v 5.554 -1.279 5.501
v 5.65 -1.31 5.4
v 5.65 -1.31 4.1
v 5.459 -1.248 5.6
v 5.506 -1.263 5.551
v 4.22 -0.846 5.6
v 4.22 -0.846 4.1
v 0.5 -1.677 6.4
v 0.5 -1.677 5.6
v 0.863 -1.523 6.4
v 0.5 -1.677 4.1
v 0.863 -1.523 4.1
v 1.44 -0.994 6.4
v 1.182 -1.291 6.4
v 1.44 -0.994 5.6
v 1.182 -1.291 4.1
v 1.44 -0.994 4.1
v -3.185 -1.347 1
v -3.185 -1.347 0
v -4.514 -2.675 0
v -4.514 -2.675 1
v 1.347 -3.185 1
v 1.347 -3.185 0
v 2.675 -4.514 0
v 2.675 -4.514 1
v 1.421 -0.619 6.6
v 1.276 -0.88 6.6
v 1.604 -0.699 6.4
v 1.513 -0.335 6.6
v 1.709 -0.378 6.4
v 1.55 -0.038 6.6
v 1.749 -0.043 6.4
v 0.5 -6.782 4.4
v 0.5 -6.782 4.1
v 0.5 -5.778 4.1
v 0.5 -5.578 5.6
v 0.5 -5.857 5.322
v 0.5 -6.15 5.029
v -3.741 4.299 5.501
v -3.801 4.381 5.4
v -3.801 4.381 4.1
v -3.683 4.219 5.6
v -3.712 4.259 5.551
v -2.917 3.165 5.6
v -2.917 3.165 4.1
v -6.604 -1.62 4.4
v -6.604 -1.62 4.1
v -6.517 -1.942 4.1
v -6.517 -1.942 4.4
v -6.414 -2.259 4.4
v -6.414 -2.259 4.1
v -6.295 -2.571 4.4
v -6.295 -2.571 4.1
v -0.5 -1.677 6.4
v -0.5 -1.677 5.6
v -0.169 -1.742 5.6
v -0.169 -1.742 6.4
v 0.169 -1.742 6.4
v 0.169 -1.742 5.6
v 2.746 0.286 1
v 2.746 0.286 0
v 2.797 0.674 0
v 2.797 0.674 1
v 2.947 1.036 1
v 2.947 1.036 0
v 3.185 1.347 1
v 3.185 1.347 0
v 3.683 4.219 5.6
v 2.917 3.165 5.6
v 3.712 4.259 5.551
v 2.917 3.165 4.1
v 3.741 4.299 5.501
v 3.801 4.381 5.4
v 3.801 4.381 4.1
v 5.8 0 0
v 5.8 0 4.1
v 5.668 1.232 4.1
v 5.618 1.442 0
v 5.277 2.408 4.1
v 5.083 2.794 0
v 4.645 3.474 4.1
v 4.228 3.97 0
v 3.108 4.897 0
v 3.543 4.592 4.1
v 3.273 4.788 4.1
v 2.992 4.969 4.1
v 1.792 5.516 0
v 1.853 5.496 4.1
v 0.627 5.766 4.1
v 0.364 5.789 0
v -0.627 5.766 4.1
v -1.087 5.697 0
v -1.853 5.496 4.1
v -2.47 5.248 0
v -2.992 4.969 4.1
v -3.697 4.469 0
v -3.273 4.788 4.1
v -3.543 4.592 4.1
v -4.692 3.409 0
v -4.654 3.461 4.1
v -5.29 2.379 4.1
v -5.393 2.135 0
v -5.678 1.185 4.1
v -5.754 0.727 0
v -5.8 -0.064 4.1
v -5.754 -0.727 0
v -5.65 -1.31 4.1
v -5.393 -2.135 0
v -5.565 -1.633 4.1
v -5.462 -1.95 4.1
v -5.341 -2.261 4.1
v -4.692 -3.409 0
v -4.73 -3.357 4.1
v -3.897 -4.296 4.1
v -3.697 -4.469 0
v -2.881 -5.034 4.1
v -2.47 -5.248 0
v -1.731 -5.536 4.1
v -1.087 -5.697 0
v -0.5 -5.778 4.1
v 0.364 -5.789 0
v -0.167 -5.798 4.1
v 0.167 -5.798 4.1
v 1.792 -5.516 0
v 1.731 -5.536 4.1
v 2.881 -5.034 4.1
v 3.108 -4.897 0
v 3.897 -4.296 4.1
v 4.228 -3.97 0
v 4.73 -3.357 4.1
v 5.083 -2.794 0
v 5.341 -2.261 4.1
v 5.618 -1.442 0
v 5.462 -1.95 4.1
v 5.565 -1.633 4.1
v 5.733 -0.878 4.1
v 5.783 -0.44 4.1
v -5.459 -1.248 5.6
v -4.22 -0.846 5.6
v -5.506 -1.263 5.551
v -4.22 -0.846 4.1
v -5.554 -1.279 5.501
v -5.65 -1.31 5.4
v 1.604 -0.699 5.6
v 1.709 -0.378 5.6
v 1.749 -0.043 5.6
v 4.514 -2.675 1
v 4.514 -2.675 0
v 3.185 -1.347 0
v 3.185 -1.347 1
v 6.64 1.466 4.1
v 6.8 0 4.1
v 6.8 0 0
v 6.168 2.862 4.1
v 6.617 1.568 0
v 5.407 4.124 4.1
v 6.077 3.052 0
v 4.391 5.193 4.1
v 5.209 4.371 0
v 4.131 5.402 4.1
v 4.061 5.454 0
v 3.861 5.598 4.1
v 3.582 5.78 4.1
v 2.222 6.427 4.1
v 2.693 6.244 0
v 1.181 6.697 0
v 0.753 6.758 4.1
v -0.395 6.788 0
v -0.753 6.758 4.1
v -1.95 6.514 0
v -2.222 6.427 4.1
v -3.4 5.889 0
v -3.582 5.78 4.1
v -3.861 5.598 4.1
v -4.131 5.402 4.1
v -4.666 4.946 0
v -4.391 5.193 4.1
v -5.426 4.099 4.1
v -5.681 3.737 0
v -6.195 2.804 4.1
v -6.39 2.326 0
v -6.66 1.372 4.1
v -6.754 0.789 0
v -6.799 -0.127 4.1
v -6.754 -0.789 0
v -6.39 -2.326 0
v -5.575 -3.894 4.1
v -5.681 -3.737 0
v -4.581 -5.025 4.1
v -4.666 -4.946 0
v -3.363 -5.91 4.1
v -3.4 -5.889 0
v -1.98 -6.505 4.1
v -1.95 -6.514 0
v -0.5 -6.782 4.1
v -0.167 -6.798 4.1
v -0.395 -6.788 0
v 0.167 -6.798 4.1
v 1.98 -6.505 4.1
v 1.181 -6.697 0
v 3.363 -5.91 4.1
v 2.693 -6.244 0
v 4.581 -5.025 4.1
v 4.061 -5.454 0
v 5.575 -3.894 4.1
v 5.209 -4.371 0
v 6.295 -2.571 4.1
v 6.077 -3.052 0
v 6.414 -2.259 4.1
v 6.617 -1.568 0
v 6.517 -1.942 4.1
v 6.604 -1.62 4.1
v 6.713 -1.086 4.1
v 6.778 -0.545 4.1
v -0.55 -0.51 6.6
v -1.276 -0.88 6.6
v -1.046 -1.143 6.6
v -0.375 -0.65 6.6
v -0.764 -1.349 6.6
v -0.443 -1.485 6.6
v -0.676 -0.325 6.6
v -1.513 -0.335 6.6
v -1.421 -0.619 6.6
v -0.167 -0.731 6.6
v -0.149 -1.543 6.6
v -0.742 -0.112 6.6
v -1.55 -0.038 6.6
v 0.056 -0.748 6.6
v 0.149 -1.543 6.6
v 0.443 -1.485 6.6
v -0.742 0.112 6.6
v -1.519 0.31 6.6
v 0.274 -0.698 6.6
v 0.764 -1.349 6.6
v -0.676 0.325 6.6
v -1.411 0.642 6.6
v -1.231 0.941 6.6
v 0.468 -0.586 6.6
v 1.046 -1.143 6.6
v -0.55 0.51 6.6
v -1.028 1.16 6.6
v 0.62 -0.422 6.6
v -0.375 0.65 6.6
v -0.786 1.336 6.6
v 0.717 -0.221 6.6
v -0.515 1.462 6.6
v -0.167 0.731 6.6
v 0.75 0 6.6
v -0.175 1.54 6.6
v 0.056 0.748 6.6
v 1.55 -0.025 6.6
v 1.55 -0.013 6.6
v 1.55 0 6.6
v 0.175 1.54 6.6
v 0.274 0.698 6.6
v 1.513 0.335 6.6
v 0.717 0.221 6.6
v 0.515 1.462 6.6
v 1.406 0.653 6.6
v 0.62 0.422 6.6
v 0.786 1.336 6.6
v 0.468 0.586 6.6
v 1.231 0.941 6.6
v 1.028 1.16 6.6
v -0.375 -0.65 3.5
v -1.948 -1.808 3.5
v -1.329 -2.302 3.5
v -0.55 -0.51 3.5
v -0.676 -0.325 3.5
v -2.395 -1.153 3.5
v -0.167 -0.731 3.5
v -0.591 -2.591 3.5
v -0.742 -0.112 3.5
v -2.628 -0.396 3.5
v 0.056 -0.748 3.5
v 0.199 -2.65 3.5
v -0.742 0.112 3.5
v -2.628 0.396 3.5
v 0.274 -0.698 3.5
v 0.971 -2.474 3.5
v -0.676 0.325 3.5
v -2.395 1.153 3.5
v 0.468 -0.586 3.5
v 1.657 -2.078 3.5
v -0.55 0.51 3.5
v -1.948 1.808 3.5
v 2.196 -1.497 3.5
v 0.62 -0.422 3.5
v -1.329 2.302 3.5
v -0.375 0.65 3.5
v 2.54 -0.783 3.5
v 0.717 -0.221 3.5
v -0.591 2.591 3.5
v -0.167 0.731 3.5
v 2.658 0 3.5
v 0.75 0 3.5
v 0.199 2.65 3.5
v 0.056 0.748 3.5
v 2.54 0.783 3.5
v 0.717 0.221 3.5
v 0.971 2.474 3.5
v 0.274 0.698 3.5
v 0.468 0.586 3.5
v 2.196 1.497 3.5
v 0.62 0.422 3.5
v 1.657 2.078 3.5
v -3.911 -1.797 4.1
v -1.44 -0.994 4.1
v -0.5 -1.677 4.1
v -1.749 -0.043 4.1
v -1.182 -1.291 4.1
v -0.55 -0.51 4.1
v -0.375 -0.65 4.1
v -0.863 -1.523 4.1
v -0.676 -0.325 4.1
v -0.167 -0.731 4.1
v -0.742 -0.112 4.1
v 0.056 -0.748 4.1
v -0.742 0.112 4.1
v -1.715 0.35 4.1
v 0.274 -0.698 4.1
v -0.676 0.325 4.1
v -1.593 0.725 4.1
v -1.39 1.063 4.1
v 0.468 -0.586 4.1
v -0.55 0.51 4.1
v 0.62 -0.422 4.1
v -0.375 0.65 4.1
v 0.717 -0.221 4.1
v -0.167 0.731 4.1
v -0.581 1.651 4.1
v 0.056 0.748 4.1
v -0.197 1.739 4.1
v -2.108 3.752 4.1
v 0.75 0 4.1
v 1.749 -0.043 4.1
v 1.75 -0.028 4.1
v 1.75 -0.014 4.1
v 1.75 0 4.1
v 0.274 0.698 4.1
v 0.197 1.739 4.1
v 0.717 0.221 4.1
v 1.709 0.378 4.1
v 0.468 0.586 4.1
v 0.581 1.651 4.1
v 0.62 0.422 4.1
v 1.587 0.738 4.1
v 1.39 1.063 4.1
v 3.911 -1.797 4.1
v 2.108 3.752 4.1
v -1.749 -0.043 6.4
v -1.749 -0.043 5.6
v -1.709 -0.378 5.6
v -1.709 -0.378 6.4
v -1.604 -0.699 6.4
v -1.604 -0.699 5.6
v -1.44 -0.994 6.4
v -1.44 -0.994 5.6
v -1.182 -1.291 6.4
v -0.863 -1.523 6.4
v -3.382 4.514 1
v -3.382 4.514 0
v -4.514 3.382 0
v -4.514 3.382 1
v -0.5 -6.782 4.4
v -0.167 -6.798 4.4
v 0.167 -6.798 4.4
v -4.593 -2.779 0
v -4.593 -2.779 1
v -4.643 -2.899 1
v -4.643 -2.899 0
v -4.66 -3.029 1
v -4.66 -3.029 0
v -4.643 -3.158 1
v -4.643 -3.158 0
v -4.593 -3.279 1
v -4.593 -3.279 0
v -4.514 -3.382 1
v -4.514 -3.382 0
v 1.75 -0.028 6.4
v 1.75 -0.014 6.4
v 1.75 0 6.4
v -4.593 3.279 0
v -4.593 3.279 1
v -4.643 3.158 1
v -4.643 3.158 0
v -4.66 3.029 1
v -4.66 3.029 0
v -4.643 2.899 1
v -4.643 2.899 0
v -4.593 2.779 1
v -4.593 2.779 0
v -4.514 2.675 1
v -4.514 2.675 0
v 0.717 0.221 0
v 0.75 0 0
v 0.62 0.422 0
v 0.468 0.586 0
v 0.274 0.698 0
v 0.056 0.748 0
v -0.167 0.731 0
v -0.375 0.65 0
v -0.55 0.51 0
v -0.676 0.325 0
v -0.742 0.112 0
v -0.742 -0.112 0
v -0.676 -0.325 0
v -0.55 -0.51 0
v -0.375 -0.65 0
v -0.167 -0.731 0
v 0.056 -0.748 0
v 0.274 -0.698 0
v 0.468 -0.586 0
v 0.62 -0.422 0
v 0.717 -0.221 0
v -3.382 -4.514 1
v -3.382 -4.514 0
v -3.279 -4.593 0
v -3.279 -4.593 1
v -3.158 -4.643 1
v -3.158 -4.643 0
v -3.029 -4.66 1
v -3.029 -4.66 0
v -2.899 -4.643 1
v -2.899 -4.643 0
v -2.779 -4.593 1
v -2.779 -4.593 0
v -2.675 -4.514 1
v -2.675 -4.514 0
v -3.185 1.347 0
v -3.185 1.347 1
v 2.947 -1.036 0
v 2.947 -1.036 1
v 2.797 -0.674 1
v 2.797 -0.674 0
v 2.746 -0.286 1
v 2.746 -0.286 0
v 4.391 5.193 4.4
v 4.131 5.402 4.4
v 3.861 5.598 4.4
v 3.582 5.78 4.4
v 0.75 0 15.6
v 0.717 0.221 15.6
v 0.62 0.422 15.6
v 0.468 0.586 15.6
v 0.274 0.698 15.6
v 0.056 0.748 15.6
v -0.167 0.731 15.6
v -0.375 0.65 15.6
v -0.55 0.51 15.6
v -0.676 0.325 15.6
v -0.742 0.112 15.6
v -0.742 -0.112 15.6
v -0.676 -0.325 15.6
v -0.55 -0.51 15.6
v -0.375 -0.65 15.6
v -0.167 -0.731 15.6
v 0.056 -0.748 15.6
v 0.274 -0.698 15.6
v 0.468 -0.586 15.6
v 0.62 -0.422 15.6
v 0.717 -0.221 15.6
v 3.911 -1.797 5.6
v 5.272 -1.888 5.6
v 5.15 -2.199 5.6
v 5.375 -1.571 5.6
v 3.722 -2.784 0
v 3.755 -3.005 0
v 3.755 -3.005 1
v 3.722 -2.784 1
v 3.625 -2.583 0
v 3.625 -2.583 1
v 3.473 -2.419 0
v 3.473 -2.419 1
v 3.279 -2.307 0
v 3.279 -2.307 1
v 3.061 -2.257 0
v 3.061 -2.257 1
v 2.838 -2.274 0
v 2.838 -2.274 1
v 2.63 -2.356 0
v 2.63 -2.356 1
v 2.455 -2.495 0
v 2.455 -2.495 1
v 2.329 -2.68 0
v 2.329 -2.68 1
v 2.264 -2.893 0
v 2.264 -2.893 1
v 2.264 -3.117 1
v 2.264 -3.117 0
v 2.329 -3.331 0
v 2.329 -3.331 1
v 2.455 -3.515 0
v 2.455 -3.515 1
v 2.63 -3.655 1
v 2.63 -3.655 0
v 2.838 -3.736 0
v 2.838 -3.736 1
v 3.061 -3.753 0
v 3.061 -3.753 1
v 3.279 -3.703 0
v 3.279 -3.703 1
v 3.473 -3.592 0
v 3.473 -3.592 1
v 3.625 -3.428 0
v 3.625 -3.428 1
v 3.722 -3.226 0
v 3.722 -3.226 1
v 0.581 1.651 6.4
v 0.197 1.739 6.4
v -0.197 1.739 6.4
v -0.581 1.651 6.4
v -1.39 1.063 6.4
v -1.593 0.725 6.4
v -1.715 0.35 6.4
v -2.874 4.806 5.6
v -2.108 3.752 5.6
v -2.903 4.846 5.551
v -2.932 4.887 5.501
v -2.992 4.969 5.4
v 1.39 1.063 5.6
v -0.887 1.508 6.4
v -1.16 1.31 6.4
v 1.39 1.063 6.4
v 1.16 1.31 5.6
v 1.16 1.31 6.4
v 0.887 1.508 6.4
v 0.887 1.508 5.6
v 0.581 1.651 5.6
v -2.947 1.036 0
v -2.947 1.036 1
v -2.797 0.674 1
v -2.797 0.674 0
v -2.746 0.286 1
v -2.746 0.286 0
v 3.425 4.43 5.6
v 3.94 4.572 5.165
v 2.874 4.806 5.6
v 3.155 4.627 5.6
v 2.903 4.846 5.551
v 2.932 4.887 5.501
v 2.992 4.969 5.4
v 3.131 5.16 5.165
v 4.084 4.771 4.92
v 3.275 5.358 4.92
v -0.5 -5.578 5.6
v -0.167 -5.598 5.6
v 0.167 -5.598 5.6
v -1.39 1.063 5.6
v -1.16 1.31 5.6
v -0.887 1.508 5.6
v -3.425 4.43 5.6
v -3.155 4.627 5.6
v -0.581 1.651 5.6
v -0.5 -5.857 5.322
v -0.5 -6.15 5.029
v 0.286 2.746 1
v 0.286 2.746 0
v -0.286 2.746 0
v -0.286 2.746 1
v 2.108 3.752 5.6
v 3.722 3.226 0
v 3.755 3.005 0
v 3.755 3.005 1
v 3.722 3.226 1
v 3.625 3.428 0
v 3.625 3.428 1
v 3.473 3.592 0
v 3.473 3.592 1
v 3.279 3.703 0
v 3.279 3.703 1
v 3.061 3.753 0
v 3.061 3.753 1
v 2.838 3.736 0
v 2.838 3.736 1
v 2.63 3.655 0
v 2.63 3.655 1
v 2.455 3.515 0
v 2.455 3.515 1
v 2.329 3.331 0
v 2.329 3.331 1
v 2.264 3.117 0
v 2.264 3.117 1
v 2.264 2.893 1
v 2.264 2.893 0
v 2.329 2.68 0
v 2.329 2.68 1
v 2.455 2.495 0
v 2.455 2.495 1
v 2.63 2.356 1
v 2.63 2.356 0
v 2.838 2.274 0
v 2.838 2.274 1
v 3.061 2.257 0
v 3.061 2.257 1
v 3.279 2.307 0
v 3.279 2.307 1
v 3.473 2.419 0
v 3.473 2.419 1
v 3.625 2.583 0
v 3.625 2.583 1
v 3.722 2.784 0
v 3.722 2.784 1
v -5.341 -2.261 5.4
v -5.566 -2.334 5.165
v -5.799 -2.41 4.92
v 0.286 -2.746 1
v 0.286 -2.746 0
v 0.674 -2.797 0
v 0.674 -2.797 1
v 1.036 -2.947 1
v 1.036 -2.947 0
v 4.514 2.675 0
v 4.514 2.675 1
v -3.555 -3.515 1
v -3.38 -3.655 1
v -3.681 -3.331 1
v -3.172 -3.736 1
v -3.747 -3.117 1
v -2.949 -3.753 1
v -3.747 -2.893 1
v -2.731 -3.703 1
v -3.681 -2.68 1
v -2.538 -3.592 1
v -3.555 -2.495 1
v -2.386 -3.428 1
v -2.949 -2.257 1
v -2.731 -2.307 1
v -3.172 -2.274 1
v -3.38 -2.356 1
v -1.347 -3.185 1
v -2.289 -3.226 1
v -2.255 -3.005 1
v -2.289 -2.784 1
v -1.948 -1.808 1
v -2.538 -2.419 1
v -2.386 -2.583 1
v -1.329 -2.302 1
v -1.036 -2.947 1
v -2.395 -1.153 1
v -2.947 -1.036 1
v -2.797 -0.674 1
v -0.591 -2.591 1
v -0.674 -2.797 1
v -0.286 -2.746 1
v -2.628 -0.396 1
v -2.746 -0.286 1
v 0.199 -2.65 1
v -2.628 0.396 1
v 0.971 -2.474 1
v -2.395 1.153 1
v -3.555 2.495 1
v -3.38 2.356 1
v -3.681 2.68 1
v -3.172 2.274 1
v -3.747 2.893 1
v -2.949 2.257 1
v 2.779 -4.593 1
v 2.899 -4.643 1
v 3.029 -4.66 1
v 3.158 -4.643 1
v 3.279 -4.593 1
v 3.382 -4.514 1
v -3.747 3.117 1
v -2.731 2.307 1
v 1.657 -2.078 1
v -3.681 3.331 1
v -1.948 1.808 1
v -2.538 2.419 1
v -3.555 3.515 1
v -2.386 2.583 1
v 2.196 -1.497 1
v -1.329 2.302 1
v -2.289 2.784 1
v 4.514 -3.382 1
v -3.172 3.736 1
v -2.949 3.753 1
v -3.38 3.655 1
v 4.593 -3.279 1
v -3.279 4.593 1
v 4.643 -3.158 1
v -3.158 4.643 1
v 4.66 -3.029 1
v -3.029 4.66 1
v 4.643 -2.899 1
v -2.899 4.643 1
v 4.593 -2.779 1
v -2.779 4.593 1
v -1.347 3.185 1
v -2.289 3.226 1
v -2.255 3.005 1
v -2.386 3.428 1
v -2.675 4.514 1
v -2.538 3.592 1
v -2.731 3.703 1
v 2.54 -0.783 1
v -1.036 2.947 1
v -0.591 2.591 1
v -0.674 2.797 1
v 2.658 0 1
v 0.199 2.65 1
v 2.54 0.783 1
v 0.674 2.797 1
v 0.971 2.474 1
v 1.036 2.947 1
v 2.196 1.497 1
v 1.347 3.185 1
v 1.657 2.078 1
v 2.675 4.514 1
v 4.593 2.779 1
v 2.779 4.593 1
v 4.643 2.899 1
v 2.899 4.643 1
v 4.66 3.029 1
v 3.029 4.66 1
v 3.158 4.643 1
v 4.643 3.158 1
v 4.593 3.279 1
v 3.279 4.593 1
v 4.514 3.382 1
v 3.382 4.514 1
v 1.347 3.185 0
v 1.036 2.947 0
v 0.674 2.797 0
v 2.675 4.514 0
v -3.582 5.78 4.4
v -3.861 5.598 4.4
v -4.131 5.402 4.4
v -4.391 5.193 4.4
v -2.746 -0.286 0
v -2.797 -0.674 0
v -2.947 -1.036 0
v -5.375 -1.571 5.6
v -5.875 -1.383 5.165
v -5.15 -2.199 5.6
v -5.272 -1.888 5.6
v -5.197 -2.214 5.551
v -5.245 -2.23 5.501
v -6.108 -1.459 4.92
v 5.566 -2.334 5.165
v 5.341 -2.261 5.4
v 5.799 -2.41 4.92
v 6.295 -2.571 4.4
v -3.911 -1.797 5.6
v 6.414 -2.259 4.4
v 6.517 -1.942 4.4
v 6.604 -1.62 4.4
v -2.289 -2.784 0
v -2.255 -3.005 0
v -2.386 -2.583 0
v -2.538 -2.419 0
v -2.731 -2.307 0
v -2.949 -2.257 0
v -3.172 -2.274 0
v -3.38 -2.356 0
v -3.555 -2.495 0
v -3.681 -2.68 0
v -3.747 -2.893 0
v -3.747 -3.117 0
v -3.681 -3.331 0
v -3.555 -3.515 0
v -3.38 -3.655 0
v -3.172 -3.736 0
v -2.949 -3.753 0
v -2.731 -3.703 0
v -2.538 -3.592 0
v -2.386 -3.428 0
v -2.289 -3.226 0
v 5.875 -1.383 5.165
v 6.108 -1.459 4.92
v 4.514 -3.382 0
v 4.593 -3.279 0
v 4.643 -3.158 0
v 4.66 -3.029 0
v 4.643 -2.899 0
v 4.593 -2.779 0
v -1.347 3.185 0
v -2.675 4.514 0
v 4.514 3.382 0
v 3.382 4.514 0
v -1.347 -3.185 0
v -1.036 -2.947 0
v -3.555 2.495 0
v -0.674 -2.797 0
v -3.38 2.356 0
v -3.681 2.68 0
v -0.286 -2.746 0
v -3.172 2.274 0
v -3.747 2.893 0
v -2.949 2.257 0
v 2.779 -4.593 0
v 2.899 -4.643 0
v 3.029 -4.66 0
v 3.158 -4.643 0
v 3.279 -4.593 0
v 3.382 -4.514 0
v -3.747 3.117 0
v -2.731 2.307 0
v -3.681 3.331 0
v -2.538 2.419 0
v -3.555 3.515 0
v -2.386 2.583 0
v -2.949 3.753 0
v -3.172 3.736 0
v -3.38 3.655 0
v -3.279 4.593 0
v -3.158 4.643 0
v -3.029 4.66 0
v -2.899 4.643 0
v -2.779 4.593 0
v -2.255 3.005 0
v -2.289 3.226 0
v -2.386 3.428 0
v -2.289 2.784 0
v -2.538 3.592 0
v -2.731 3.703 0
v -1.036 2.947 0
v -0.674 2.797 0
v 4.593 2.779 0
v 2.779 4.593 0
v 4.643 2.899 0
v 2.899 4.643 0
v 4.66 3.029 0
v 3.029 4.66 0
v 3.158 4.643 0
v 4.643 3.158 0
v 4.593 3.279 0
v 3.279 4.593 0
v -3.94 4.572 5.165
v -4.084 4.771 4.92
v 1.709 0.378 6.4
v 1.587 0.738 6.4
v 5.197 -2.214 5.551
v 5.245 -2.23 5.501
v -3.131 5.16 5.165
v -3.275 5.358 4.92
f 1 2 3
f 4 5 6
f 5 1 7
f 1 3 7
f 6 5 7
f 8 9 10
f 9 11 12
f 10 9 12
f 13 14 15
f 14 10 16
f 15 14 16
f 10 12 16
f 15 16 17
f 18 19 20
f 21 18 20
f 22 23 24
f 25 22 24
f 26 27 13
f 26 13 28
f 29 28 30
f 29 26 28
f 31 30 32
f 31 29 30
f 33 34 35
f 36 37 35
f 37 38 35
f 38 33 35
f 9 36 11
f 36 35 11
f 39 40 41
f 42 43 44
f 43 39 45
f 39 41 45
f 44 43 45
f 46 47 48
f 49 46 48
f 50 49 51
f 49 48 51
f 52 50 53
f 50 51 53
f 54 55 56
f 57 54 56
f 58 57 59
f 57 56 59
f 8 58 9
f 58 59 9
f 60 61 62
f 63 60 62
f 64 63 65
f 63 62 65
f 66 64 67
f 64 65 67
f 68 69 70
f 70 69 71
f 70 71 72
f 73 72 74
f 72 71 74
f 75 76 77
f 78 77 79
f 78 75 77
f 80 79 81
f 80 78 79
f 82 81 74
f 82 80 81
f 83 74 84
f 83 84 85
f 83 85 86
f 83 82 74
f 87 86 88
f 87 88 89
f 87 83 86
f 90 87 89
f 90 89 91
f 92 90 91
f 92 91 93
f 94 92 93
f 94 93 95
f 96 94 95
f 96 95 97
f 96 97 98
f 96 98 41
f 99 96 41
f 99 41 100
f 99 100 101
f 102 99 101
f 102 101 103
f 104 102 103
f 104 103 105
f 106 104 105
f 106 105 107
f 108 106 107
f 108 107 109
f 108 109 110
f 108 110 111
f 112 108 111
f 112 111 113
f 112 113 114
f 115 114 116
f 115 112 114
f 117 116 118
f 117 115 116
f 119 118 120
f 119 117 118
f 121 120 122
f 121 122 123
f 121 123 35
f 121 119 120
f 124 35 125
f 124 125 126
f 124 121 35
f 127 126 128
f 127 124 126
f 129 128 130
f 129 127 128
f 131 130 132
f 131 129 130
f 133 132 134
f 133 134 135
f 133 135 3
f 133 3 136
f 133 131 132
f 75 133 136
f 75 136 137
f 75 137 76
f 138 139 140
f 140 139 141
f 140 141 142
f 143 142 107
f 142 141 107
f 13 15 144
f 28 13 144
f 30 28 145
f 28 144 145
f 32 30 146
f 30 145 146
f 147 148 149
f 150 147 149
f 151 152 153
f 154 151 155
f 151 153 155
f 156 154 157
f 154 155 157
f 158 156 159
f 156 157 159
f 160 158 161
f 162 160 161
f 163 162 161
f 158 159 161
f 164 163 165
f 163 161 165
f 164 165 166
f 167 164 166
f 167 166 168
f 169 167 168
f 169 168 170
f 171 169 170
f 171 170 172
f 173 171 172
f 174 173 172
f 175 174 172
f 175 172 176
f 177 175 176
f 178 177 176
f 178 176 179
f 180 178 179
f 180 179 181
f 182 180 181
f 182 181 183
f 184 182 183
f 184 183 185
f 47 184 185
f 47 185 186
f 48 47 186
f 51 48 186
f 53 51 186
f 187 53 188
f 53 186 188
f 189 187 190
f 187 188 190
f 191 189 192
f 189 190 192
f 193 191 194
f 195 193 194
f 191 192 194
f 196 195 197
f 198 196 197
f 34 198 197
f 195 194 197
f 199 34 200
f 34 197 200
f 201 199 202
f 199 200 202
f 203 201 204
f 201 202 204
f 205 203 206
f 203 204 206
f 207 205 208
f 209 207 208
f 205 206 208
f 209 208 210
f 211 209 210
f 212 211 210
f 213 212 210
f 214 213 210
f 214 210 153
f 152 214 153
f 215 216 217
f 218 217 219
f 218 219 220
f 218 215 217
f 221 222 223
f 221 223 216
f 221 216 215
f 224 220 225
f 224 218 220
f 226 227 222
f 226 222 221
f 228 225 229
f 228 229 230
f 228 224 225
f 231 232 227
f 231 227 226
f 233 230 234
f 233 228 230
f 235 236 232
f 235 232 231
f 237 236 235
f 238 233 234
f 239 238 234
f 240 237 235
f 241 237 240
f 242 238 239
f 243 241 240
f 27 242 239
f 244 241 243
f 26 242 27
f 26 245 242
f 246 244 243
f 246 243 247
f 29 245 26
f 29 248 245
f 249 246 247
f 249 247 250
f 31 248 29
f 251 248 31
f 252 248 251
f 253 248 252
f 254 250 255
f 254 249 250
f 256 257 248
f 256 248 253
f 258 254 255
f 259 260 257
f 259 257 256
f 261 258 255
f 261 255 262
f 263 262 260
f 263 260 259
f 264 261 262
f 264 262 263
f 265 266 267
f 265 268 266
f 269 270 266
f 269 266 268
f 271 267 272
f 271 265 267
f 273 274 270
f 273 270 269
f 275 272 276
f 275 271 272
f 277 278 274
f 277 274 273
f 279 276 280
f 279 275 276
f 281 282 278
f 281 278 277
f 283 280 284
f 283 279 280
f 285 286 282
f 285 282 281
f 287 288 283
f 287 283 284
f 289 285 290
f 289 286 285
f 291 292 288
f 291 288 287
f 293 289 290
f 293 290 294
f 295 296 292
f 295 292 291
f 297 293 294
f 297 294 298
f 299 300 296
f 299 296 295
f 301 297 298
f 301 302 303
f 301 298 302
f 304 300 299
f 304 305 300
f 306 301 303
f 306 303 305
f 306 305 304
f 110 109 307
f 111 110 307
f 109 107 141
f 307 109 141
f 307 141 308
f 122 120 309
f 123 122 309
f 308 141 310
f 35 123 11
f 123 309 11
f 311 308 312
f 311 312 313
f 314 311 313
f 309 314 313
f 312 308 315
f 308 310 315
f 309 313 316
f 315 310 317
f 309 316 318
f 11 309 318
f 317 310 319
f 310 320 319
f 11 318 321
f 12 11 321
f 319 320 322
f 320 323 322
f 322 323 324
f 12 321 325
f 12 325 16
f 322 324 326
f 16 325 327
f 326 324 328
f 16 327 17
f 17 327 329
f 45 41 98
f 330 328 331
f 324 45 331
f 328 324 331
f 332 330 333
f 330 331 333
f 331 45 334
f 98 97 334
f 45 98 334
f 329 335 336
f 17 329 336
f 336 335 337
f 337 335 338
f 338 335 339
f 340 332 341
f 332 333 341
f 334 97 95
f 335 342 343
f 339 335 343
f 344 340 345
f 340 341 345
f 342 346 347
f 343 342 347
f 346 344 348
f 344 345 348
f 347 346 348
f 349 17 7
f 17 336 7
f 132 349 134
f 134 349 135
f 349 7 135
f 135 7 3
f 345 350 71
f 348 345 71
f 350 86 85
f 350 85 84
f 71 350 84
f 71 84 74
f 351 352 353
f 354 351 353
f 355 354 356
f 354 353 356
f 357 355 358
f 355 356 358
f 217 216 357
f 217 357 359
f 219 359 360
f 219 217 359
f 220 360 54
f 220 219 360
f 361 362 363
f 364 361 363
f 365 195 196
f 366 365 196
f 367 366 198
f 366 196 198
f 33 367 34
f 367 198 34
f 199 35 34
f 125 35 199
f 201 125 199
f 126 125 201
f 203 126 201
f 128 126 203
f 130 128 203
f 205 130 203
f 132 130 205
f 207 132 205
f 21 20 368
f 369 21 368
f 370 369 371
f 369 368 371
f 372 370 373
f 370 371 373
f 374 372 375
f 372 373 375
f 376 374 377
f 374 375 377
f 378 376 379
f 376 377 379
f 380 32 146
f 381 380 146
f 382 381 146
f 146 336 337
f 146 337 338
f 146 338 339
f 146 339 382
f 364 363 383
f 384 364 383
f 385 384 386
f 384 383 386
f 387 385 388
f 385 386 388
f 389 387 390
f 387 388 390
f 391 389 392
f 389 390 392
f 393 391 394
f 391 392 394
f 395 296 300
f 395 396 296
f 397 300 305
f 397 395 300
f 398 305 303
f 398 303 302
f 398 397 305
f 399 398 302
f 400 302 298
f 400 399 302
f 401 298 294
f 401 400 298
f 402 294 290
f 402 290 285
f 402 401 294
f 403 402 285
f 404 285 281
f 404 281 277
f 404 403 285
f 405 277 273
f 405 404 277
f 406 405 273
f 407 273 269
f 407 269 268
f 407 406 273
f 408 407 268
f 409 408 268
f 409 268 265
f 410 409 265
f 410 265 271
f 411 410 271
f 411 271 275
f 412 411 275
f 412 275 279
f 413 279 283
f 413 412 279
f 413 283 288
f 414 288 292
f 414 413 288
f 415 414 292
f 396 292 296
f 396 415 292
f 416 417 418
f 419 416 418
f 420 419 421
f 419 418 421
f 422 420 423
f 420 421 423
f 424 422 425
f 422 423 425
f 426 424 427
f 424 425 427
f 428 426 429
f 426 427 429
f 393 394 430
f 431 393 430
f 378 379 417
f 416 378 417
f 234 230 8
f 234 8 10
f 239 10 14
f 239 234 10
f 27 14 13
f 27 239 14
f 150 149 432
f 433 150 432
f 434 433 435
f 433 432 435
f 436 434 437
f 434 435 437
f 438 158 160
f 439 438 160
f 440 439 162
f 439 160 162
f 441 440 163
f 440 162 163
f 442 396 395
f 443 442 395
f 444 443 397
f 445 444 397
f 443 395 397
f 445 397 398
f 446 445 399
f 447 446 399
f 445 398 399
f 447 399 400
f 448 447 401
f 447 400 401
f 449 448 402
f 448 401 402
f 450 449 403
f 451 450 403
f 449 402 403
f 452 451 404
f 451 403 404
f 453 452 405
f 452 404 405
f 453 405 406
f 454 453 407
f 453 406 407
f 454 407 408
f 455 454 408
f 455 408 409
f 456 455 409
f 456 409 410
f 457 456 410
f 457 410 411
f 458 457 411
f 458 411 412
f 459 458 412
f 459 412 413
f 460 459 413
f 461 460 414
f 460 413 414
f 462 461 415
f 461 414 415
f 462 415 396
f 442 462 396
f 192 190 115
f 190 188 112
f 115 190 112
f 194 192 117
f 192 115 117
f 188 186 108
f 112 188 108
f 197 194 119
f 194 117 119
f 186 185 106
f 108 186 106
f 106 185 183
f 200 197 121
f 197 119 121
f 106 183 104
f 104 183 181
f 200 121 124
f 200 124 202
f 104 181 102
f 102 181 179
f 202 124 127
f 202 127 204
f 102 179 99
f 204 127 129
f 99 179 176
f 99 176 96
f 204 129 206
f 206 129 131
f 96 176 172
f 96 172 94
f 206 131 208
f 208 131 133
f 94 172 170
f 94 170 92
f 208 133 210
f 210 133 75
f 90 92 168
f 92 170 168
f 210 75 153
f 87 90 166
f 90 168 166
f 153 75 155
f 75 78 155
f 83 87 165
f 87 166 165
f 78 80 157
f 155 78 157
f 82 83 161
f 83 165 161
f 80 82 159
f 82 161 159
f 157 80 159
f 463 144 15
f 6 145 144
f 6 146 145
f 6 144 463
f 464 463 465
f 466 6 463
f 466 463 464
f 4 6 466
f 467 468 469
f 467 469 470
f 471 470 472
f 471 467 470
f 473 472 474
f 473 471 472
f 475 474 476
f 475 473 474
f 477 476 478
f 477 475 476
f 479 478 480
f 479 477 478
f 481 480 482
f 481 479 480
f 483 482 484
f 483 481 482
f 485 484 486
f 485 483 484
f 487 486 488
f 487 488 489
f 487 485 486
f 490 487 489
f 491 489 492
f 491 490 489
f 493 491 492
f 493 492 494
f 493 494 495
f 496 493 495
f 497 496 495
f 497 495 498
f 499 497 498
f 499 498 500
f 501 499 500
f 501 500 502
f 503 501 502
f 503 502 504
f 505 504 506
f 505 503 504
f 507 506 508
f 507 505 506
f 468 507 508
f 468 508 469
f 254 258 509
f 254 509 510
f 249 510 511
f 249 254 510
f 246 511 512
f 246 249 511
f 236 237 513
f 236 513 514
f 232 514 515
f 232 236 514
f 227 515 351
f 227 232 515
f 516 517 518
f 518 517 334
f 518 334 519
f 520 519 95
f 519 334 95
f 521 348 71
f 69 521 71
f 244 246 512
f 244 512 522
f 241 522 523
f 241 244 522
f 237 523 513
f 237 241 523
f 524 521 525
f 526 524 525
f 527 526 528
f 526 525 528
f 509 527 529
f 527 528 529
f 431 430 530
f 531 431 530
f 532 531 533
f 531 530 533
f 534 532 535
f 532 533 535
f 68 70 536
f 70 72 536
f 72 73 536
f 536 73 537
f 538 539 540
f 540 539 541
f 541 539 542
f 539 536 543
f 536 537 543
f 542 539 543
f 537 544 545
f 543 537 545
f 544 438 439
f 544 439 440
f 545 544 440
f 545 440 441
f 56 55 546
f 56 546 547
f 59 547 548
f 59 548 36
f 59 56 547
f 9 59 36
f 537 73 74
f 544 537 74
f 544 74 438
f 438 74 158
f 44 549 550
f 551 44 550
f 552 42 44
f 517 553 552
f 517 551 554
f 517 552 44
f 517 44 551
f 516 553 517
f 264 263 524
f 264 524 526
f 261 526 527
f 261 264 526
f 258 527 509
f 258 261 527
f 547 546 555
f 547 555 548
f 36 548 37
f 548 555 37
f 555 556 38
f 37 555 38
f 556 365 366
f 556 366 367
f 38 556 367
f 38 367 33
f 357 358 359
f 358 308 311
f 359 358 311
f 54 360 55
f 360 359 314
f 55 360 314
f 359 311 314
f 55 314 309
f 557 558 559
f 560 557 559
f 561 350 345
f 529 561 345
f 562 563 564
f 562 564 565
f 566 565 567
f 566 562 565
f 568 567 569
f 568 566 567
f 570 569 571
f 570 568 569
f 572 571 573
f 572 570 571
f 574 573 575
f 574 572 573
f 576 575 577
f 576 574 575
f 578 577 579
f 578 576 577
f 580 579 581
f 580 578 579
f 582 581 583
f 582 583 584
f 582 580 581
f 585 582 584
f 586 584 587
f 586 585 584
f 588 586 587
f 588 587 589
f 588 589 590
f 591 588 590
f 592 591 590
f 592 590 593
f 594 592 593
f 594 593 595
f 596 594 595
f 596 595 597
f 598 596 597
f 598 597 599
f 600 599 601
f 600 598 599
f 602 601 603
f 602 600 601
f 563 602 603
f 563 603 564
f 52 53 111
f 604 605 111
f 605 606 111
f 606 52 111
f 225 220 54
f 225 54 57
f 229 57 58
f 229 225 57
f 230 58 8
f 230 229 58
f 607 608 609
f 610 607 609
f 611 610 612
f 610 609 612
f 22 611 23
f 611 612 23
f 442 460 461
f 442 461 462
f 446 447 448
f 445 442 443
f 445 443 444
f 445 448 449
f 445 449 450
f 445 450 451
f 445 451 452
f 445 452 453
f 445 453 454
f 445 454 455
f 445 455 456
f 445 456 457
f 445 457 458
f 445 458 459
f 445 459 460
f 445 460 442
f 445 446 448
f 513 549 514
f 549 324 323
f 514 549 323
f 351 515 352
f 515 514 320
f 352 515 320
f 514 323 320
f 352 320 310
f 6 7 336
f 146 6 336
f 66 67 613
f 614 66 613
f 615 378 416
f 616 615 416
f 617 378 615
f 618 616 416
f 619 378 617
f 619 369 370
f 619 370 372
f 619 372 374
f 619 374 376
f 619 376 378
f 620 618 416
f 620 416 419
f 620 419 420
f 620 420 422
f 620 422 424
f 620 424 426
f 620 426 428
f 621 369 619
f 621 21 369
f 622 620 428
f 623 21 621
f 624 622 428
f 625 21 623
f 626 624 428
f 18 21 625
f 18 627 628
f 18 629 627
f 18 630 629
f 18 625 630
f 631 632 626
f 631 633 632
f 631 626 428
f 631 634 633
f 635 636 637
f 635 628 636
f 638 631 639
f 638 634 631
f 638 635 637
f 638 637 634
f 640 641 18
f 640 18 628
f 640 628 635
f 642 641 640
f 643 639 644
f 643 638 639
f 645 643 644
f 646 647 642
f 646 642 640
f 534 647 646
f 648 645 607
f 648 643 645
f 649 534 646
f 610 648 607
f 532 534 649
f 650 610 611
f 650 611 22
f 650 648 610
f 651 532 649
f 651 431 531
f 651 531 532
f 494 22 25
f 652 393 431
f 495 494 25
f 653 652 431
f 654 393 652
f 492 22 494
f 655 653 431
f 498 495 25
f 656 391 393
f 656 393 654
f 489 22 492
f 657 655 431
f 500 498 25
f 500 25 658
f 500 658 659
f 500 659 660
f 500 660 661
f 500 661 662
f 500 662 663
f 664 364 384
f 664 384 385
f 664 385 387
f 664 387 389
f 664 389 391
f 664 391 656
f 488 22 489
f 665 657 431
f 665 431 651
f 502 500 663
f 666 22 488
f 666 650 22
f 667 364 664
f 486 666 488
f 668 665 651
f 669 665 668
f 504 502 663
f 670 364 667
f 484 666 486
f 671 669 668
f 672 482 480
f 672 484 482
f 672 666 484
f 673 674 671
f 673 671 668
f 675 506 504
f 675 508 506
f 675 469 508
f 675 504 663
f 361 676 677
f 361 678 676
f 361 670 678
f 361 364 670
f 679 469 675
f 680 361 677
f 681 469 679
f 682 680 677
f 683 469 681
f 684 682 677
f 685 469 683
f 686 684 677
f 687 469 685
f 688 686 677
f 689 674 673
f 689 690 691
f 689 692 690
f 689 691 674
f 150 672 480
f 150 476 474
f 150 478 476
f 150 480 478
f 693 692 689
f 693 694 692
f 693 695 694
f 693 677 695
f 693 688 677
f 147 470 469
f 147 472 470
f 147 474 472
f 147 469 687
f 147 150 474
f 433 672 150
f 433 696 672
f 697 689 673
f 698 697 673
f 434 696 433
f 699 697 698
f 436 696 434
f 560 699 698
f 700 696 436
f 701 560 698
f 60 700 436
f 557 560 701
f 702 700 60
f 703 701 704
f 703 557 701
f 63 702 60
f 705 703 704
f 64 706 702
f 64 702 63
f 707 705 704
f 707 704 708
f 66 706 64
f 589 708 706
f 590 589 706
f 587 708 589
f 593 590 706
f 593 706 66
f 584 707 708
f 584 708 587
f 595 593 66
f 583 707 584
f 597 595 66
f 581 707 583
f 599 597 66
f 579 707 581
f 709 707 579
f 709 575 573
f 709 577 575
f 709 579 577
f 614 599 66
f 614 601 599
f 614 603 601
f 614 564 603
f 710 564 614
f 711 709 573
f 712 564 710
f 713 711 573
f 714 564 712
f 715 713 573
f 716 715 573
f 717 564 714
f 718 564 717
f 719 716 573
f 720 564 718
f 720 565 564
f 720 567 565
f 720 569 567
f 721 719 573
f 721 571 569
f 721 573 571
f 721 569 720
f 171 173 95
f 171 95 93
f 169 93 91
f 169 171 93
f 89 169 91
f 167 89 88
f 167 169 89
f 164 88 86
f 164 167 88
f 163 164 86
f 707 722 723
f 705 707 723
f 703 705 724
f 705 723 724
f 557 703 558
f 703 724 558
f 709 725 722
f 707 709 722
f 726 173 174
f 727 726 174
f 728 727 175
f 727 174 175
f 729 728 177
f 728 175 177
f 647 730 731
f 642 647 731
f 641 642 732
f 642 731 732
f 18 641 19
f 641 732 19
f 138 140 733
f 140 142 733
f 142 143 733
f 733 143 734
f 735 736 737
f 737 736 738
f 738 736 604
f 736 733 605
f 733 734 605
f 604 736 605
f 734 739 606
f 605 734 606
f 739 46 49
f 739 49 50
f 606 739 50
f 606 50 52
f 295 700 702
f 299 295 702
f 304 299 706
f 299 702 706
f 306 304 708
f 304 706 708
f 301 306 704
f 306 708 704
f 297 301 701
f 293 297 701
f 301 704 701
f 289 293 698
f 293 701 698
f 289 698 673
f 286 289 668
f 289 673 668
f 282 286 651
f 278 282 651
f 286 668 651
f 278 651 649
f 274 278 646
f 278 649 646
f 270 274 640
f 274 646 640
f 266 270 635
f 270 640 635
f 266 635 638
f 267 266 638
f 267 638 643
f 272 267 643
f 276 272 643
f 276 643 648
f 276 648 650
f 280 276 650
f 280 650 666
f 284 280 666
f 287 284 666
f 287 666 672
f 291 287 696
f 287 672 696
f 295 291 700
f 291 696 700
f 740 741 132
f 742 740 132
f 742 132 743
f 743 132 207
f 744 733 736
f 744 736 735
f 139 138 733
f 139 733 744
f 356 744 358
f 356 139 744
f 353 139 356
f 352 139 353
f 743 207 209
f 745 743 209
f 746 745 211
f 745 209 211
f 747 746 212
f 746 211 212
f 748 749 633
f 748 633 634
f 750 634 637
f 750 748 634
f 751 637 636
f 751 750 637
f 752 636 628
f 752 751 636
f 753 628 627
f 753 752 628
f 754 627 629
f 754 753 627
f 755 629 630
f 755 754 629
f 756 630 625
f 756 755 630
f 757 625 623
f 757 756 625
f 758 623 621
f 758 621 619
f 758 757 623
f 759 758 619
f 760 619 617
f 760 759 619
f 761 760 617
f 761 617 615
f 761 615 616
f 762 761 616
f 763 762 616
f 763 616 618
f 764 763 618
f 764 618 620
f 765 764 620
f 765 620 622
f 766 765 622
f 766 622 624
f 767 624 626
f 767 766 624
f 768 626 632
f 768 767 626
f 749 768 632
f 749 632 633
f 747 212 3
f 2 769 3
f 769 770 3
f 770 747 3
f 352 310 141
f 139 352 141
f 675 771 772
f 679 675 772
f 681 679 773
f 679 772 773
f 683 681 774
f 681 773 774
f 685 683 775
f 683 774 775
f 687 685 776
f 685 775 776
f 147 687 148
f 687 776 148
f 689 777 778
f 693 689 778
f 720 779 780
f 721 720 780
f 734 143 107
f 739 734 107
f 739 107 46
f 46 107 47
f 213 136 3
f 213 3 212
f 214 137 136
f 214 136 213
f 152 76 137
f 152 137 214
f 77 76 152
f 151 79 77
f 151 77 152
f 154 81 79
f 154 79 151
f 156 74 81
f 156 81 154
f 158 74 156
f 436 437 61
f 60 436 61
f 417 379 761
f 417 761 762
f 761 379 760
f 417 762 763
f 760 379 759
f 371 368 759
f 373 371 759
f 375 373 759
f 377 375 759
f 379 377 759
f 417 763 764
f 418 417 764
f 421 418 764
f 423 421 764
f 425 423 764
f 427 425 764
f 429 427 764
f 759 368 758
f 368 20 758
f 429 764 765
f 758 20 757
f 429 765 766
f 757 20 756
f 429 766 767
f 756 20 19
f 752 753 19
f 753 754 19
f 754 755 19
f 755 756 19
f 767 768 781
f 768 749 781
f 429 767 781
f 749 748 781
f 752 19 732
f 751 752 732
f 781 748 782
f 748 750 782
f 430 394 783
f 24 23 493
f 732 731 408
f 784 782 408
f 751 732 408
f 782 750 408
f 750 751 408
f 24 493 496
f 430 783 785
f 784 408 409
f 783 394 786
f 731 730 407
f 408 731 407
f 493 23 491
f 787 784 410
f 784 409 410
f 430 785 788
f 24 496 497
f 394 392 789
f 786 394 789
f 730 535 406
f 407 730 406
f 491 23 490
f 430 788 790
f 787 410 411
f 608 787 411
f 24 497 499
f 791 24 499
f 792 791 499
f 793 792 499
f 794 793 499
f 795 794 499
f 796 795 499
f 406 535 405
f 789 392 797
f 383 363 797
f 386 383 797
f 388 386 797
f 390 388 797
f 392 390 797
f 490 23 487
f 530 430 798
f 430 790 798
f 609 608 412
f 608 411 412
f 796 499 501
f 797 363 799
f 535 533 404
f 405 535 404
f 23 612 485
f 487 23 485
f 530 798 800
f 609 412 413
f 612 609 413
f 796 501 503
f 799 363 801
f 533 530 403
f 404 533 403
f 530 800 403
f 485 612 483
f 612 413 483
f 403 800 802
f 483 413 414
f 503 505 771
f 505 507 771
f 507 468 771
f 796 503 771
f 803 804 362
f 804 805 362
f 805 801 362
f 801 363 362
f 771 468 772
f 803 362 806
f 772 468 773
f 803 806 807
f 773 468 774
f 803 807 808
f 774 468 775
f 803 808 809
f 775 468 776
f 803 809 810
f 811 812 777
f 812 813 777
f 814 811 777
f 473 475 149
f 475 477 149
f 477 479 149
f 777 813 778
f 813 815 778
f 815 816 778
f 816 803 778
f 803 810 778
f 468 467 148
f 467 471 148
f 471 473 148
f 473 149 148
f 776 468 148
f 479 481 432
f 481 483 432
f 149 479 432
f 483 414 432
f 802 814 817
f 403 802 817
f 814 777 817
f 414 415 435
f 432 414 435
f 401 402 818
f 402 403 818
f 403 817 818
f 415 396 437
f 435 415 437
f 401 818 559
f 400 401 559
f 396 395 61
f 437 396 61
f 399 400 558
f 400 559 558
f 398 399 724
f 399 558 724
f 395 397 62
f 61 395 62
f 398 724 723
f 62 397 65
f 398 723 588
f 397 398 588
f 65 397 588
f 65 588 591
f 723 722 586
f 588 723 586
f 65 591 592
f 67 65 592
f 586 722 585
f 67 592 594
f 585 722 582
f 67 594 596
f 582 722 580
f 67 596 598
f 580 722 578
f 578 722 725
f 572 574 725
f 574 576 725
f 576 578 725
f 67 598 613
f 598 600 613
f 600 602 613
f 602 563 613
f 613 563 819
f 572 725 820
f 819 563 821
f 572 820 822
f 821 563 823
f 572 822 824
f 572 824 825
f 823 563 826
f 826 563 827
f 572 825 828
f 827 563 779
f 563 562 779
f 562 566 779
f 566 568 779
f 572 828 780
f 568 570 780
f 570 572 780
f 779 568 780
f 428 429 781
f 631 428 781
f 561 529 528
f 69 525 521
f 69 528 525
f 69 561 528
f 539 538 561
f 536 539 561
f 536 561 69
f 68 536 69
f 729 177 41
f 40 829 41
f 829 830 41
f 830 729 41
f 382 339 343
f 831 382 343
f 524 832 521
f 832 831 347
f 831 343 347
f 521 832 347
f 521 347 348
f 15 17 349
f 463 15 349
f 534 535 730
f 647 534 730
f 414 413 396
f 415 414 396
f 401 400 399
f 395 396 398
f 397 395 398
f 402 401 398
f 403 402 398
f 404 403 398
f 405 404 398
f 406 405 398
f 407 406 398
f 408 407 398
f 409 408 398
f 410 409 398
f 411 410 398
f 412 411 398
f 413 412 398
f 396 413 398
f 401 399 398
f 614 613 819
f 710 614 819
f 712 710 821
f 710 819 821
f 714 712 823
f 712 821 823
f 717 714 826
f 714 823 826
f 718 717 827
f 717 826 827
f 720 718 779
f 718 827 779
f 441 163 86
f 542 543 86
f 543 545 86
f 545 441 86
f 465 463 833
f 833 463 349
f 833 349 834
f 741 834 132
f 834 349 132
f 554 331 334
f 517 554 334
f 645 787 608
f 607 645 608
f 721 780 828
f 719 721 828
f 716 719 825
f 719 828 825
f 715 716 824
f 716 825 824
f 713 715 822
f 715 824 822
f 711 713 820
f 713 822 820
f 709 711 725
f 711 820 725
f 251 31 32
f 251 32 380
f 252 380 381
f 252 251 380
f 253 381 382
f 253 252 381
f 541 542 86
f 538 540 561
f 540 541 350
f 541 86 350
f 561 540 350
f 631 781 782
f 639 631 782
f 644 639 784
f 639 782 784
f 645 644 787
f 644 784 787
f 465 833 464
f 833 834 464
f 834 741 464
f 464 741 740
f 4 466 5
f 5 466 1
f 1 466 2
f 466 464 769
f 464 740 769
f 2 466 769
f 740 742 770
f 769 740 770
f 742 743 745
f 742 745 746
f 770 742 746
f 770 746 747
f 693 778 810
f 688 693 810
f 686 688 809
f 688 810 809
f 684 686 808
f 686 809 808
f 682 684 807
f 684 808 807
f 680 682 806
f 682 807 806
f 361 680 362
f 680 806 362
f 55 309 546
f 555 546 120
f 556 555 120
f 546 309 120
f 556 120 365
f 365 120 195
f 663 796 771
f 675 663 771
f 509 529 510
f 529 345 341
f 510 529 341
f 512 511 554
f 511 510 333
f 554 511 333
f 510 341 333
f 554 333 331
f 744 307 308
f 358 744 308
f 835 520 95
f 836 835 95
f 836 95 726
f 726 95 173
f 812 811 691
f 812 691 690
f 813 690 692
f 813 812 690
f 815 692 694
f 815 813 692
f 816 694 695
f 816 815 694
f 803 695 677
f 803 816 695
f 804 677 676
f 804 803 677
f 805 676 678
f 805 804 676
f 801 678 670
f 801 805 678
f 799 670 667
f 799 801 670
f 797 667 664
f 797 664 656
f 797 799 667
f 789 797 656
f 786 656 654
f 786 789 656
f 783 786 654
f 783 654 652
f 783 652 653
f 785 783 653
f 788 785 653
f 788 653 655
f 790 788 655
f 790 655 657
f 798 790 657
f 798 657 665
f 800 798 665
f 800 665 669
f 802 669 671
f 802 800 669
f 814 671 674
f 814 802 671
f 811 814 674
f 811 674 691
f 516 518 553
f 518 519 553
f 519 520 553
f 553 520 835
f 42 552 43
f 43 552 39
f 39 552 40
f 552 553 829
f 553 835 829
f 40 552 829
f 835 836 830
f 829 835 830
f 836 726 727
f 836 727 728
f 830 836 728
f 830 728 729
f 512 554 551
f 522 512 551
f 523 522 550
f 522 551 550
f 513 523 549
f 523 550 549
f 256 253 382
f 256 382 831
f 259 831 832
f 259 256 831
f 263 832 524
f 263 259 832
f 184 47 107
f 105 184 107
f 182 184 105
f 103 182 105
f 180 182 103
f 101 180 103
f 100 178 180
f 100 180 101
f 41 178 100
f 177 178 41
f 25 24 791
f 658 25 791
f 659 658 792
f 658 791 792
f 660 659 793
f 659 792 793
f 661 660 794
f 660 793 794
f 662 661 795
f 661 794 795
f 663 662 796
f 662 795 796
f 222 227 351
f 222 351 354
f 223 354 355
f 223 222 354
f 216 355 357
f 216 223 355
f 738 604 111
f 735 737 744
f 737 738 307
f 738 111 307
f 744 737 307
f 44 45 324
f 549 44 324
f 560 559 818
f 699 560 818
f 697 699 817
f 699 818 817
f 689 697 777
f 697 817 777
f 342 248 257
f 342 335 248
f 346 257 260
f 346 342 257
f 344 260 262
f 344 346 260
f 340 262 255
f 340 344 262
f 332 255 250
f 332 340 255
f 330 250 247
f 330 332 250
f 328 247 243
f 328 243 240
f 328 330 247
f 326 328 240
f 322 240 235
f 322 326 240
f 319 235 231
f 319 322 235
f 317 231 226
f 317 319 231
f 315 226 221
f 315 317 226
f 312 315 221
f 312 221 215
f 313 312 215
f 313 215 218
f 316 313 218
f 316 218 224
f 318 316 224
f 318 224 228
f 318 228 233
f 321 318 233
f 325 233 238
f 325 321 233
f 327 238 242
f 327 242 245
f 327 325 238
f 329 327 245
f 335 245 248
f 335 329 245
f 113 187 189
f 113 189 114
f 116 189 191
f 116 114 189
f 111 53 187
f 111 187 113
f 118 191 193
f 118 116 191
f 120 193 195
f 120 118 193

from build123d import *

# Parameters (mm, degrees)
F0_R      = 0.75
F1_DEPTH  = 1
F2_R      = 6.8
F2_R_2    = 5.8
F3_DEPTH  = 4.1
F4_R      = 2.6577966349
F4_R_2    = 0.75
F5_DEPTH  = 2.5
F6_R      = 0.75
F7_DEPTH  = 1.5
F8_SIZE   = 1.2
F9_R      = 0.75
F10_DEPTH = 15.6
F11_R     = 0.75
F12_DEPTH = 1
F13_SIZE  = 0.2


with BuildPart() as f1:
    # F0 (on Top) → F1 (new body)
    with BuildSketch(Plane.XY):
        with BuildLine():
            Line((4.5137502952, 3.3823794453), (3.3823794453, 4.5137502952))
            ThreePointArc((3.3823794453, 4.5137502952), (3.0288260547, 4.6601969046), (2.6752726641, 4.5137502952))
            Line((2.6752726641, 4.5137502952), (1.3468455393, 3.1853231704))
            ThreePointArc((1.3468455393, 3.1853231704), (0.8602105161, 2.8601640434), (0.2861853675, 2.7459833422))
            Line((0.2861853675, 2.7459833422), (-0.2861853675, 2.7459833422))
            ThreePointArc((-0.2861853675, 2.7459833422), (-0.8602105161, 2.8601640434), (-1.3468455393, 3.1853231704))
            Line((-1.3468455393, 3.1853231704), (-2.6752726641, 4.5137502952))
            ThreePointArc((-2.6752726641, 4.5137502952), (-3.0288260547, 4.6601969046), (-3.3823794453, 4.5137502952))
            Line((-3.3823794453, 4.5137502952), (-4.5137502952, 3.3823794453))
            ThreePointArc((-4.5137502952, 3.3823794453), (-4.6601969046, 3.0288260547), (-4.5137502952, 2.6752726641))
            Line((-4.5137502952, 2.6752726641), (-3.1853231704, 1.3468455393))
            ThreePointArc((-3.1853231704, 1.3468455393), (-2.8601640434, 0.8602105161), (-2.7459833422, 0.2861853675))
            Line((-2.7459833422, 0.2861853675), (-2.7459833422, -0.2861853675))
            ThreePointArc((-2.7459833422, -0.2861853675), (-2.8601640434, -0.8602105161), (-3.1853231704, -1.3468455393))
            Line((-3.1853231704, -1.3468455393), (-4.5137502952, -2.6752726641))
            ThreePointArc((-4.5137502952, -2.6752726641), (-4.6601969046, -3.0288260547), (-4.5137502952, -3.3823794453))
            Line((-4.5137502952, -3.3823794453), (-3.3823794453, -4.5137502952))
            ThreePointArc((-3.3823794453, -4.5137502952), (-3.0288260547, -4.6601969046), (-2.6752726641, -4.5137502952))
            Line((-2.6752726641, -4.5137502952), (-1.3468455393, -3.1853231704))
            ThreePointArc((-1.3468455393, -3.1853231704), (-0.8602105161, -2.8601640434), (-0.2861853675, -2.7459833422))
            Line((-0.2861853675, -2.7459833422), (0.2861853675, -2.7459833422))
            ThreePointArc((0.2861853675, -2.7459833422), (0.8602105161, -2.8601640434), (1.3468455393, -3.1853231704))
            Line((1.3468455393, -3.1853231704), (2.6752726641, -4.5137502952))
            ThreePointArc((2.6752726641, -4.5137502952), (3.0288260547, -4.6601969046), (3.3823794453, -4.5137502952))
            Line((3.3823794453, -4.5137502952), (4.5137502952, -3.3823794453))
            ThreePointArc((4.5137502952, -3.3823794453), (4.6601969046, -3.0288260547), (4.5137502952, -2.6752726641))
            Line((4.5137502952, -2.6752726641), (3.1853231704, -1.3468455393))
            ThreePointArc((3.1853231704, -1.3468455393), (2.8601640434, -0.8602105161), (2.7459833422, -0.2861853675))
            Line((2.7459833422, -0.2861853675), (2.7459833422, 0.2861853675))
            ThreePointArc((2.7459833422, 0.2861853675), (2.8601640434, 0.8602105161), (3.1853231704, 1.3468455393))
            Line((3.1853231704, 1.3468455393), (4.5137502952, 2.6752726641))
            ThreePointArc((4.5137502952, 2.6752726641), (4.6601969046, 3.0288260547), (4.5137502952, 3.3823794453))
        make_face()
        with Locations((-3.00520382, -3.00520382)):
            Circle(F0_R, mode=Mode.SUBTRACT)
        with Locations((3.00520382, -3.00520382)):
            Circle(F0_R, mode=Mode.SUBTRACT)
        with Locations((-3.00520382, 3.00520382)):
            Circle(F0_R, mode=Mode.SUBTRACT)
        Circle(F0_R, mode=Mode.SUBTRACT)
        with Locations((3.00520382, 3.00520382)):
            Circle(F0_R, mode=Mode.SUBTRACT)
    extrude(amount=F1_DEPTH)

    # F4 (on face) → F5 (join)
    with BuildSketch(Plane.XY.offset(1)):
        Circle(F4_R)
        Circle(F4_R_2, mode=Mode.SUBTRACT)
    extrude(amount=F5_DEPTH)


with BuildPart() as f3:
    # F2 (on Top) → F3 (new body)
    with BuildSketch(Plane.XY):
        Circle(F2_R)
        Circle(F2_R_2, mode=Mode.SUBTRACT)
    extrude(amount=F3_DEPTH)

    # F6 (on face) → F7 (join)
    with BuildSketch(Plane.XY.offset(4.1)):
        with BuildLine():
            ThreePointArc((-1.3902543324, 1.0628701196), (-1.0286241915, 1.4157797402), (-0.581237338, 1.6506553719))
            Line((-0.581237338, 1.6506553719), (-2.1082734564, 3.7524402771))
            Line((-2.1082734564, 3.7524402771), (-2.9919545571, 4.9687229676))
            ThreePointArc((-2.9919545571, 4.9687229676), (-3.4091544633, 4.6922985674), (-3.8009715514, 4.3809377153))
            Line((-3.8009715514, 4.3809377153), (-2.9172904507, 3.1646550248))
            Line((-2.9172904507, 3.1646550248), (-1.3902543324, 1.0628701196))
        make_face()
        with BuildLine():
            ThreePointArc((-3.8009715514, 4.3809377153), (-3.4091544633, 4.6922985674), (-2.9919545571, 4.9687229676))
            Line((-2.9919545571, 4.9687229676), (-3.5816116985, 5.7803163963))
            ThreePointArc((-3.5816116985, 5.7803163963), (-3.9969397156, 5.5013155617), (-4.3906286929, 5.192531144))
            Line((-4.3906286929, 5.192531144), (-3.8009715514, 4.3809377153))
        make_face()
        with BuildLine():
            ThreePointArc((0.581237338, 1.6506553719), (1.0286241915, 1.4157797402), (1.3902543324, 1.0628701196))
            Line((1.3902543324, 1.0628701196), (2.9172904507, 3.1646550248))
            Line((2.9172904507, 3.1646550248), (3.8009715514, 4.3809377153))
            ThreePointArc((3.8009715514, 4.3809377153), (3.4091544633, 4.6922985674), (2.9919545571, 4.9687229676))
            Line((2.9919545571, 4.9687229676), (2.1082734564, 3.7524402771))
            Line((2.1082734564, 3.7524402771), (0.581237338, 1.6506553719))
        make_face()
        with BuildLine():
            ThreePointArc((2.9919545571, 4.9687229676), (3.4091544633, 4.6922985674), (3.8009715514, 4.3809377153))
            Line((3.8009715514, 4.3809377153), (4.3906286929, 5.192531144))
            ThreePointArc((4.3906286929, 5.192531144), (3.9969397156, 5.5013155617), (3.5816116985, 5.7803163963))
            Line((3.5816116985, 5.7803163963), (2.9919545571, 4.9687229676))
        make_face()
        with BuildLine():
            Line((4.2202751043, -0.8455193928), (1.7494787628, -0.0427089961))
            ThreePointArc((1.7494787628, -0.0427089961), (1.6643489035, -0.5407797402), (1.4404617685, -0.9937655124))
            Line((1.4404617685, -0.9937655124), (3.91125811, -1.7965759091))
            Line((3.91125811, -1.7965759091), (5.3410841661, -2.2611545569))
            ThreePointArc((5.3410841661, -2.2611545569), (5.5161277945, -1.7922985674), (5.6501011605, -1.3100980406))
            Line((5.6501011605, -1.3100980406), (4.2202751043, -0.8455193928))
        make_face()
        with BuildLine():
            Line((6.604186457, -1.6200991454), (5.6501011605, -1.3100980406))
            ThreePointArc((5.6501011605, -1.3100980406), (5.5161277945, -1.7922985674), (5.3410841661, -2.2611545569))
            Line((5.3410841661, -2.2611545569), (6.2951694627, -2.5711556617))
            ThreePointArc((6.2951694627, -2.5711556617), (6.4671843108, -2.1013155617), (6.604186457, -1.6200991454))
        make_face()
        with BuildLine():
            Line((0.5, -4.275), (0.5, -1.6770509831))
            ThreePointArc((0.5, -1.6770509831), (0, -1.75), (-0.5, -1.6770509831))
            Line((-0.5, -1.6770509831), (-0.5, -4.275))
            Line((-0.5, -4.275), (-0.5, -5.7784080853))
            ThreePointArc((-0.5, -5.7784080853), (0, -5.8), (0.5, -5.7784080853))
            Line((0.5, -5.7784080853), (0.5, -4.275))
        make_face()
        with BuildLine():
            ThreePointArc((-1.4404617685, -0.9937655124), (-1.6643489035, -0.5407797402), (-1.7494787628, -0.0427089961))
            Line((-1.7494787628, -0.0427089961), (-4.2202751043, -0.8455193928))
            Line((-4.2202751043, -0.8455193928), (-5.6501011605, -1.3100980406))
            ThreePointArc((-5.6501011605, -1.3100980406), (-5.5161277945, -1.7922985674), (-5.3410841661, -2.2611545569))
            Line((-5.3410841661, -2.2611545569), (-3.91125811, -1.7965759091))
            Line((-3.91125811, -1.7965759091), (-1.4404617685, -0.9937655124))
        make_face()
        with BuildLine():
            ThreePointArc((-5.3410841661, -2.2611545569), (-5.5161277945, -1.7922985674), (-5.6501011605, -1.3100980406))
            Line((-5.6501011605, -1.3100980406), (-6.604186457, -1.6200991454))
            ThreePointArc((-6.604186457, -1.6200991454), (-6.4671843108, -2.1013155617), (-6.2951694627, -2.5711556617))
            Line((-6.2951694627, -2.5711556617), (-5.3410841661, -2.2611545569))
        make_face()
        with BuildLine():
            ThreePointArc((1.7494787628, -0.0427089961), (1.7498696859, -0.0213560883), (1.75, 0))
            ThreePointArc((1.75, 0), (1.6576255732, 0.5610503178), (1.3902543324, 1.0628701196))
            ThreePointArc((1.3902543324, 1.0628701196), (1.0286241915, 1.4157797402), (0.581237338, 1.6506553719))
            ThreePointArc((0.581237338, 1.6506553719), (0, 1.75), (-0.581237338, 1.6506553719))
            ThreePointArc((-0.581237338, 1.6506553719), (-1.0286241915, 1.4157797402), (-1.3902543324, 1.0628701196))
            ThreePointArc((-1.3902543324, 1.0628701196), (-1.6643489035, 0.5407797402), (-1.7494787628, -0.0427089961))
            ThreePointArc((-1.7494787628, -0.0427089961), (-1.6643489035, -0.5407797402), (-1.4404617685, -0.9937655124))
            ThreePointArc((-1.4404617685, -0.9937655124), (-1.0286241915, -1.4157797402), (-0.5, -1.6770509831))
            ThreePointArc((-0.5, -1.6770509831), (0, -1.75), (0.5, -1.6770509831))
            ThreePointArc((0.5, -1.6770509831), (1.0286241915, -1.4157797402), (1.4404617685, -0.9937655124))
            ThreePointArc((1.4404617685, -0.9937655124), (1.6643489035, -0.5407797402), (1.7494787628, -0.0427089961))
        make_face()
        Circle(F6_R, mode=Mode.SUBTRACT)
        with BuildLine():
            Line((0.5, -6.7815927333), (0.5, -5.7784080853))
            ThreePointArc((0.5, -5.7784080853), (0, -5.8), (-0.5, -5.7784080853))
            Line((-0.5, -5.7784080853), (-0.5, -6.7815927333))
            ThreePointArc((-0.5, -6.7815927333), (0, -6.8), (0.5, -6.7815927333))
        make_face()
    extrude(amount=F7_DEPTH)

    # F8
    f8_edges = [f3.edges().sort_by_distance(p)[0] for p in [
        (-6.467184, -2.101316, 5.6),
        (-3.99694, 5.501316, 5.6),
        (3.99694, 5.501316, 5.6),
        (6.467184, -2.101316, 5.6),
        (0, -6.8, 5.6),
    ]]
    chamfer(f8_edges, length=F8_SIZE)

    # F11 (on face) → F12 (join)
    with BuildSketch(Plane.XY.offset(5.6)):
        with BuildLine():
            ThreePointArc((1.7494787628, -0.0427089961), (1.7498696859, -0.0213560883), (1.75, 0))
            ThreePointArc((1.75, 0), (1.6576255732, 0.5610503178), (1.3902543324, 1.0628701196))
            ThreePointArc((1.3902543324, 1.0628701196), (1.0286241915, 1.4157797402), (0.581237338, 1.6506553719))
            ThreePointArc((0.581237338, 1.6506553719), (0, 1.75), (-0.581237338, 1.6506553719))
            ThreePointArc((-0.581237338, 1.6506553719), (-1.0286241915, 1.4157797402), (-1.3902543324, 1.0628701196))
            ThreePointArc((-1.3902543324, 1.0628701196), (-1.6643489035, 0.5407797402), (-1.7494787628, -0.0427089961))
            ThreePointArc((-1.7494787628, -0.0427089961), (-1.6643489035, -0.5407797402), (-1.4404617685, -0.9937655124))
            ThreePointArc((-1.4404617685, -0.9937655124), (-1.0286241915, -1.4157797402), (-0.5, -1.6770509831))
            ThreePointArc((-0.5, -1.6770509831), (0, -1.75), (0.5, -1.6770509831))
            ThreePointArc((0.5, -1.6770509831), (1.0286241915, -1.4157797402), (1.4404617685, -0.9937655124))
            ThreePointArc((1.4404617685, -0.9937655124), (1.6643489035, -0.5407797402), (1.7494787628, -0.0427089961))
        make_face()
        Circle(F11_R, mode=Mode.SUBTRACT)
    extrude(amount=F12_DEPTH)

    # F13
    f13_edges = [f3.edges().sort_by_distance(p)[0] for p in [
        (1.749479, 0.042709, 6.6),
    ]]
    chamfer(f13_edges, length=F13_SIZE)


with BuildPart() as f10:
    # F9 (on Top) → F10 (new body)
    with BuildSketch(Plane.XY):
        Circle(F9_R)
    extrude(amount=F10_DEPTH)


solid = Compound([f1.part, f3.part, f10.part])
